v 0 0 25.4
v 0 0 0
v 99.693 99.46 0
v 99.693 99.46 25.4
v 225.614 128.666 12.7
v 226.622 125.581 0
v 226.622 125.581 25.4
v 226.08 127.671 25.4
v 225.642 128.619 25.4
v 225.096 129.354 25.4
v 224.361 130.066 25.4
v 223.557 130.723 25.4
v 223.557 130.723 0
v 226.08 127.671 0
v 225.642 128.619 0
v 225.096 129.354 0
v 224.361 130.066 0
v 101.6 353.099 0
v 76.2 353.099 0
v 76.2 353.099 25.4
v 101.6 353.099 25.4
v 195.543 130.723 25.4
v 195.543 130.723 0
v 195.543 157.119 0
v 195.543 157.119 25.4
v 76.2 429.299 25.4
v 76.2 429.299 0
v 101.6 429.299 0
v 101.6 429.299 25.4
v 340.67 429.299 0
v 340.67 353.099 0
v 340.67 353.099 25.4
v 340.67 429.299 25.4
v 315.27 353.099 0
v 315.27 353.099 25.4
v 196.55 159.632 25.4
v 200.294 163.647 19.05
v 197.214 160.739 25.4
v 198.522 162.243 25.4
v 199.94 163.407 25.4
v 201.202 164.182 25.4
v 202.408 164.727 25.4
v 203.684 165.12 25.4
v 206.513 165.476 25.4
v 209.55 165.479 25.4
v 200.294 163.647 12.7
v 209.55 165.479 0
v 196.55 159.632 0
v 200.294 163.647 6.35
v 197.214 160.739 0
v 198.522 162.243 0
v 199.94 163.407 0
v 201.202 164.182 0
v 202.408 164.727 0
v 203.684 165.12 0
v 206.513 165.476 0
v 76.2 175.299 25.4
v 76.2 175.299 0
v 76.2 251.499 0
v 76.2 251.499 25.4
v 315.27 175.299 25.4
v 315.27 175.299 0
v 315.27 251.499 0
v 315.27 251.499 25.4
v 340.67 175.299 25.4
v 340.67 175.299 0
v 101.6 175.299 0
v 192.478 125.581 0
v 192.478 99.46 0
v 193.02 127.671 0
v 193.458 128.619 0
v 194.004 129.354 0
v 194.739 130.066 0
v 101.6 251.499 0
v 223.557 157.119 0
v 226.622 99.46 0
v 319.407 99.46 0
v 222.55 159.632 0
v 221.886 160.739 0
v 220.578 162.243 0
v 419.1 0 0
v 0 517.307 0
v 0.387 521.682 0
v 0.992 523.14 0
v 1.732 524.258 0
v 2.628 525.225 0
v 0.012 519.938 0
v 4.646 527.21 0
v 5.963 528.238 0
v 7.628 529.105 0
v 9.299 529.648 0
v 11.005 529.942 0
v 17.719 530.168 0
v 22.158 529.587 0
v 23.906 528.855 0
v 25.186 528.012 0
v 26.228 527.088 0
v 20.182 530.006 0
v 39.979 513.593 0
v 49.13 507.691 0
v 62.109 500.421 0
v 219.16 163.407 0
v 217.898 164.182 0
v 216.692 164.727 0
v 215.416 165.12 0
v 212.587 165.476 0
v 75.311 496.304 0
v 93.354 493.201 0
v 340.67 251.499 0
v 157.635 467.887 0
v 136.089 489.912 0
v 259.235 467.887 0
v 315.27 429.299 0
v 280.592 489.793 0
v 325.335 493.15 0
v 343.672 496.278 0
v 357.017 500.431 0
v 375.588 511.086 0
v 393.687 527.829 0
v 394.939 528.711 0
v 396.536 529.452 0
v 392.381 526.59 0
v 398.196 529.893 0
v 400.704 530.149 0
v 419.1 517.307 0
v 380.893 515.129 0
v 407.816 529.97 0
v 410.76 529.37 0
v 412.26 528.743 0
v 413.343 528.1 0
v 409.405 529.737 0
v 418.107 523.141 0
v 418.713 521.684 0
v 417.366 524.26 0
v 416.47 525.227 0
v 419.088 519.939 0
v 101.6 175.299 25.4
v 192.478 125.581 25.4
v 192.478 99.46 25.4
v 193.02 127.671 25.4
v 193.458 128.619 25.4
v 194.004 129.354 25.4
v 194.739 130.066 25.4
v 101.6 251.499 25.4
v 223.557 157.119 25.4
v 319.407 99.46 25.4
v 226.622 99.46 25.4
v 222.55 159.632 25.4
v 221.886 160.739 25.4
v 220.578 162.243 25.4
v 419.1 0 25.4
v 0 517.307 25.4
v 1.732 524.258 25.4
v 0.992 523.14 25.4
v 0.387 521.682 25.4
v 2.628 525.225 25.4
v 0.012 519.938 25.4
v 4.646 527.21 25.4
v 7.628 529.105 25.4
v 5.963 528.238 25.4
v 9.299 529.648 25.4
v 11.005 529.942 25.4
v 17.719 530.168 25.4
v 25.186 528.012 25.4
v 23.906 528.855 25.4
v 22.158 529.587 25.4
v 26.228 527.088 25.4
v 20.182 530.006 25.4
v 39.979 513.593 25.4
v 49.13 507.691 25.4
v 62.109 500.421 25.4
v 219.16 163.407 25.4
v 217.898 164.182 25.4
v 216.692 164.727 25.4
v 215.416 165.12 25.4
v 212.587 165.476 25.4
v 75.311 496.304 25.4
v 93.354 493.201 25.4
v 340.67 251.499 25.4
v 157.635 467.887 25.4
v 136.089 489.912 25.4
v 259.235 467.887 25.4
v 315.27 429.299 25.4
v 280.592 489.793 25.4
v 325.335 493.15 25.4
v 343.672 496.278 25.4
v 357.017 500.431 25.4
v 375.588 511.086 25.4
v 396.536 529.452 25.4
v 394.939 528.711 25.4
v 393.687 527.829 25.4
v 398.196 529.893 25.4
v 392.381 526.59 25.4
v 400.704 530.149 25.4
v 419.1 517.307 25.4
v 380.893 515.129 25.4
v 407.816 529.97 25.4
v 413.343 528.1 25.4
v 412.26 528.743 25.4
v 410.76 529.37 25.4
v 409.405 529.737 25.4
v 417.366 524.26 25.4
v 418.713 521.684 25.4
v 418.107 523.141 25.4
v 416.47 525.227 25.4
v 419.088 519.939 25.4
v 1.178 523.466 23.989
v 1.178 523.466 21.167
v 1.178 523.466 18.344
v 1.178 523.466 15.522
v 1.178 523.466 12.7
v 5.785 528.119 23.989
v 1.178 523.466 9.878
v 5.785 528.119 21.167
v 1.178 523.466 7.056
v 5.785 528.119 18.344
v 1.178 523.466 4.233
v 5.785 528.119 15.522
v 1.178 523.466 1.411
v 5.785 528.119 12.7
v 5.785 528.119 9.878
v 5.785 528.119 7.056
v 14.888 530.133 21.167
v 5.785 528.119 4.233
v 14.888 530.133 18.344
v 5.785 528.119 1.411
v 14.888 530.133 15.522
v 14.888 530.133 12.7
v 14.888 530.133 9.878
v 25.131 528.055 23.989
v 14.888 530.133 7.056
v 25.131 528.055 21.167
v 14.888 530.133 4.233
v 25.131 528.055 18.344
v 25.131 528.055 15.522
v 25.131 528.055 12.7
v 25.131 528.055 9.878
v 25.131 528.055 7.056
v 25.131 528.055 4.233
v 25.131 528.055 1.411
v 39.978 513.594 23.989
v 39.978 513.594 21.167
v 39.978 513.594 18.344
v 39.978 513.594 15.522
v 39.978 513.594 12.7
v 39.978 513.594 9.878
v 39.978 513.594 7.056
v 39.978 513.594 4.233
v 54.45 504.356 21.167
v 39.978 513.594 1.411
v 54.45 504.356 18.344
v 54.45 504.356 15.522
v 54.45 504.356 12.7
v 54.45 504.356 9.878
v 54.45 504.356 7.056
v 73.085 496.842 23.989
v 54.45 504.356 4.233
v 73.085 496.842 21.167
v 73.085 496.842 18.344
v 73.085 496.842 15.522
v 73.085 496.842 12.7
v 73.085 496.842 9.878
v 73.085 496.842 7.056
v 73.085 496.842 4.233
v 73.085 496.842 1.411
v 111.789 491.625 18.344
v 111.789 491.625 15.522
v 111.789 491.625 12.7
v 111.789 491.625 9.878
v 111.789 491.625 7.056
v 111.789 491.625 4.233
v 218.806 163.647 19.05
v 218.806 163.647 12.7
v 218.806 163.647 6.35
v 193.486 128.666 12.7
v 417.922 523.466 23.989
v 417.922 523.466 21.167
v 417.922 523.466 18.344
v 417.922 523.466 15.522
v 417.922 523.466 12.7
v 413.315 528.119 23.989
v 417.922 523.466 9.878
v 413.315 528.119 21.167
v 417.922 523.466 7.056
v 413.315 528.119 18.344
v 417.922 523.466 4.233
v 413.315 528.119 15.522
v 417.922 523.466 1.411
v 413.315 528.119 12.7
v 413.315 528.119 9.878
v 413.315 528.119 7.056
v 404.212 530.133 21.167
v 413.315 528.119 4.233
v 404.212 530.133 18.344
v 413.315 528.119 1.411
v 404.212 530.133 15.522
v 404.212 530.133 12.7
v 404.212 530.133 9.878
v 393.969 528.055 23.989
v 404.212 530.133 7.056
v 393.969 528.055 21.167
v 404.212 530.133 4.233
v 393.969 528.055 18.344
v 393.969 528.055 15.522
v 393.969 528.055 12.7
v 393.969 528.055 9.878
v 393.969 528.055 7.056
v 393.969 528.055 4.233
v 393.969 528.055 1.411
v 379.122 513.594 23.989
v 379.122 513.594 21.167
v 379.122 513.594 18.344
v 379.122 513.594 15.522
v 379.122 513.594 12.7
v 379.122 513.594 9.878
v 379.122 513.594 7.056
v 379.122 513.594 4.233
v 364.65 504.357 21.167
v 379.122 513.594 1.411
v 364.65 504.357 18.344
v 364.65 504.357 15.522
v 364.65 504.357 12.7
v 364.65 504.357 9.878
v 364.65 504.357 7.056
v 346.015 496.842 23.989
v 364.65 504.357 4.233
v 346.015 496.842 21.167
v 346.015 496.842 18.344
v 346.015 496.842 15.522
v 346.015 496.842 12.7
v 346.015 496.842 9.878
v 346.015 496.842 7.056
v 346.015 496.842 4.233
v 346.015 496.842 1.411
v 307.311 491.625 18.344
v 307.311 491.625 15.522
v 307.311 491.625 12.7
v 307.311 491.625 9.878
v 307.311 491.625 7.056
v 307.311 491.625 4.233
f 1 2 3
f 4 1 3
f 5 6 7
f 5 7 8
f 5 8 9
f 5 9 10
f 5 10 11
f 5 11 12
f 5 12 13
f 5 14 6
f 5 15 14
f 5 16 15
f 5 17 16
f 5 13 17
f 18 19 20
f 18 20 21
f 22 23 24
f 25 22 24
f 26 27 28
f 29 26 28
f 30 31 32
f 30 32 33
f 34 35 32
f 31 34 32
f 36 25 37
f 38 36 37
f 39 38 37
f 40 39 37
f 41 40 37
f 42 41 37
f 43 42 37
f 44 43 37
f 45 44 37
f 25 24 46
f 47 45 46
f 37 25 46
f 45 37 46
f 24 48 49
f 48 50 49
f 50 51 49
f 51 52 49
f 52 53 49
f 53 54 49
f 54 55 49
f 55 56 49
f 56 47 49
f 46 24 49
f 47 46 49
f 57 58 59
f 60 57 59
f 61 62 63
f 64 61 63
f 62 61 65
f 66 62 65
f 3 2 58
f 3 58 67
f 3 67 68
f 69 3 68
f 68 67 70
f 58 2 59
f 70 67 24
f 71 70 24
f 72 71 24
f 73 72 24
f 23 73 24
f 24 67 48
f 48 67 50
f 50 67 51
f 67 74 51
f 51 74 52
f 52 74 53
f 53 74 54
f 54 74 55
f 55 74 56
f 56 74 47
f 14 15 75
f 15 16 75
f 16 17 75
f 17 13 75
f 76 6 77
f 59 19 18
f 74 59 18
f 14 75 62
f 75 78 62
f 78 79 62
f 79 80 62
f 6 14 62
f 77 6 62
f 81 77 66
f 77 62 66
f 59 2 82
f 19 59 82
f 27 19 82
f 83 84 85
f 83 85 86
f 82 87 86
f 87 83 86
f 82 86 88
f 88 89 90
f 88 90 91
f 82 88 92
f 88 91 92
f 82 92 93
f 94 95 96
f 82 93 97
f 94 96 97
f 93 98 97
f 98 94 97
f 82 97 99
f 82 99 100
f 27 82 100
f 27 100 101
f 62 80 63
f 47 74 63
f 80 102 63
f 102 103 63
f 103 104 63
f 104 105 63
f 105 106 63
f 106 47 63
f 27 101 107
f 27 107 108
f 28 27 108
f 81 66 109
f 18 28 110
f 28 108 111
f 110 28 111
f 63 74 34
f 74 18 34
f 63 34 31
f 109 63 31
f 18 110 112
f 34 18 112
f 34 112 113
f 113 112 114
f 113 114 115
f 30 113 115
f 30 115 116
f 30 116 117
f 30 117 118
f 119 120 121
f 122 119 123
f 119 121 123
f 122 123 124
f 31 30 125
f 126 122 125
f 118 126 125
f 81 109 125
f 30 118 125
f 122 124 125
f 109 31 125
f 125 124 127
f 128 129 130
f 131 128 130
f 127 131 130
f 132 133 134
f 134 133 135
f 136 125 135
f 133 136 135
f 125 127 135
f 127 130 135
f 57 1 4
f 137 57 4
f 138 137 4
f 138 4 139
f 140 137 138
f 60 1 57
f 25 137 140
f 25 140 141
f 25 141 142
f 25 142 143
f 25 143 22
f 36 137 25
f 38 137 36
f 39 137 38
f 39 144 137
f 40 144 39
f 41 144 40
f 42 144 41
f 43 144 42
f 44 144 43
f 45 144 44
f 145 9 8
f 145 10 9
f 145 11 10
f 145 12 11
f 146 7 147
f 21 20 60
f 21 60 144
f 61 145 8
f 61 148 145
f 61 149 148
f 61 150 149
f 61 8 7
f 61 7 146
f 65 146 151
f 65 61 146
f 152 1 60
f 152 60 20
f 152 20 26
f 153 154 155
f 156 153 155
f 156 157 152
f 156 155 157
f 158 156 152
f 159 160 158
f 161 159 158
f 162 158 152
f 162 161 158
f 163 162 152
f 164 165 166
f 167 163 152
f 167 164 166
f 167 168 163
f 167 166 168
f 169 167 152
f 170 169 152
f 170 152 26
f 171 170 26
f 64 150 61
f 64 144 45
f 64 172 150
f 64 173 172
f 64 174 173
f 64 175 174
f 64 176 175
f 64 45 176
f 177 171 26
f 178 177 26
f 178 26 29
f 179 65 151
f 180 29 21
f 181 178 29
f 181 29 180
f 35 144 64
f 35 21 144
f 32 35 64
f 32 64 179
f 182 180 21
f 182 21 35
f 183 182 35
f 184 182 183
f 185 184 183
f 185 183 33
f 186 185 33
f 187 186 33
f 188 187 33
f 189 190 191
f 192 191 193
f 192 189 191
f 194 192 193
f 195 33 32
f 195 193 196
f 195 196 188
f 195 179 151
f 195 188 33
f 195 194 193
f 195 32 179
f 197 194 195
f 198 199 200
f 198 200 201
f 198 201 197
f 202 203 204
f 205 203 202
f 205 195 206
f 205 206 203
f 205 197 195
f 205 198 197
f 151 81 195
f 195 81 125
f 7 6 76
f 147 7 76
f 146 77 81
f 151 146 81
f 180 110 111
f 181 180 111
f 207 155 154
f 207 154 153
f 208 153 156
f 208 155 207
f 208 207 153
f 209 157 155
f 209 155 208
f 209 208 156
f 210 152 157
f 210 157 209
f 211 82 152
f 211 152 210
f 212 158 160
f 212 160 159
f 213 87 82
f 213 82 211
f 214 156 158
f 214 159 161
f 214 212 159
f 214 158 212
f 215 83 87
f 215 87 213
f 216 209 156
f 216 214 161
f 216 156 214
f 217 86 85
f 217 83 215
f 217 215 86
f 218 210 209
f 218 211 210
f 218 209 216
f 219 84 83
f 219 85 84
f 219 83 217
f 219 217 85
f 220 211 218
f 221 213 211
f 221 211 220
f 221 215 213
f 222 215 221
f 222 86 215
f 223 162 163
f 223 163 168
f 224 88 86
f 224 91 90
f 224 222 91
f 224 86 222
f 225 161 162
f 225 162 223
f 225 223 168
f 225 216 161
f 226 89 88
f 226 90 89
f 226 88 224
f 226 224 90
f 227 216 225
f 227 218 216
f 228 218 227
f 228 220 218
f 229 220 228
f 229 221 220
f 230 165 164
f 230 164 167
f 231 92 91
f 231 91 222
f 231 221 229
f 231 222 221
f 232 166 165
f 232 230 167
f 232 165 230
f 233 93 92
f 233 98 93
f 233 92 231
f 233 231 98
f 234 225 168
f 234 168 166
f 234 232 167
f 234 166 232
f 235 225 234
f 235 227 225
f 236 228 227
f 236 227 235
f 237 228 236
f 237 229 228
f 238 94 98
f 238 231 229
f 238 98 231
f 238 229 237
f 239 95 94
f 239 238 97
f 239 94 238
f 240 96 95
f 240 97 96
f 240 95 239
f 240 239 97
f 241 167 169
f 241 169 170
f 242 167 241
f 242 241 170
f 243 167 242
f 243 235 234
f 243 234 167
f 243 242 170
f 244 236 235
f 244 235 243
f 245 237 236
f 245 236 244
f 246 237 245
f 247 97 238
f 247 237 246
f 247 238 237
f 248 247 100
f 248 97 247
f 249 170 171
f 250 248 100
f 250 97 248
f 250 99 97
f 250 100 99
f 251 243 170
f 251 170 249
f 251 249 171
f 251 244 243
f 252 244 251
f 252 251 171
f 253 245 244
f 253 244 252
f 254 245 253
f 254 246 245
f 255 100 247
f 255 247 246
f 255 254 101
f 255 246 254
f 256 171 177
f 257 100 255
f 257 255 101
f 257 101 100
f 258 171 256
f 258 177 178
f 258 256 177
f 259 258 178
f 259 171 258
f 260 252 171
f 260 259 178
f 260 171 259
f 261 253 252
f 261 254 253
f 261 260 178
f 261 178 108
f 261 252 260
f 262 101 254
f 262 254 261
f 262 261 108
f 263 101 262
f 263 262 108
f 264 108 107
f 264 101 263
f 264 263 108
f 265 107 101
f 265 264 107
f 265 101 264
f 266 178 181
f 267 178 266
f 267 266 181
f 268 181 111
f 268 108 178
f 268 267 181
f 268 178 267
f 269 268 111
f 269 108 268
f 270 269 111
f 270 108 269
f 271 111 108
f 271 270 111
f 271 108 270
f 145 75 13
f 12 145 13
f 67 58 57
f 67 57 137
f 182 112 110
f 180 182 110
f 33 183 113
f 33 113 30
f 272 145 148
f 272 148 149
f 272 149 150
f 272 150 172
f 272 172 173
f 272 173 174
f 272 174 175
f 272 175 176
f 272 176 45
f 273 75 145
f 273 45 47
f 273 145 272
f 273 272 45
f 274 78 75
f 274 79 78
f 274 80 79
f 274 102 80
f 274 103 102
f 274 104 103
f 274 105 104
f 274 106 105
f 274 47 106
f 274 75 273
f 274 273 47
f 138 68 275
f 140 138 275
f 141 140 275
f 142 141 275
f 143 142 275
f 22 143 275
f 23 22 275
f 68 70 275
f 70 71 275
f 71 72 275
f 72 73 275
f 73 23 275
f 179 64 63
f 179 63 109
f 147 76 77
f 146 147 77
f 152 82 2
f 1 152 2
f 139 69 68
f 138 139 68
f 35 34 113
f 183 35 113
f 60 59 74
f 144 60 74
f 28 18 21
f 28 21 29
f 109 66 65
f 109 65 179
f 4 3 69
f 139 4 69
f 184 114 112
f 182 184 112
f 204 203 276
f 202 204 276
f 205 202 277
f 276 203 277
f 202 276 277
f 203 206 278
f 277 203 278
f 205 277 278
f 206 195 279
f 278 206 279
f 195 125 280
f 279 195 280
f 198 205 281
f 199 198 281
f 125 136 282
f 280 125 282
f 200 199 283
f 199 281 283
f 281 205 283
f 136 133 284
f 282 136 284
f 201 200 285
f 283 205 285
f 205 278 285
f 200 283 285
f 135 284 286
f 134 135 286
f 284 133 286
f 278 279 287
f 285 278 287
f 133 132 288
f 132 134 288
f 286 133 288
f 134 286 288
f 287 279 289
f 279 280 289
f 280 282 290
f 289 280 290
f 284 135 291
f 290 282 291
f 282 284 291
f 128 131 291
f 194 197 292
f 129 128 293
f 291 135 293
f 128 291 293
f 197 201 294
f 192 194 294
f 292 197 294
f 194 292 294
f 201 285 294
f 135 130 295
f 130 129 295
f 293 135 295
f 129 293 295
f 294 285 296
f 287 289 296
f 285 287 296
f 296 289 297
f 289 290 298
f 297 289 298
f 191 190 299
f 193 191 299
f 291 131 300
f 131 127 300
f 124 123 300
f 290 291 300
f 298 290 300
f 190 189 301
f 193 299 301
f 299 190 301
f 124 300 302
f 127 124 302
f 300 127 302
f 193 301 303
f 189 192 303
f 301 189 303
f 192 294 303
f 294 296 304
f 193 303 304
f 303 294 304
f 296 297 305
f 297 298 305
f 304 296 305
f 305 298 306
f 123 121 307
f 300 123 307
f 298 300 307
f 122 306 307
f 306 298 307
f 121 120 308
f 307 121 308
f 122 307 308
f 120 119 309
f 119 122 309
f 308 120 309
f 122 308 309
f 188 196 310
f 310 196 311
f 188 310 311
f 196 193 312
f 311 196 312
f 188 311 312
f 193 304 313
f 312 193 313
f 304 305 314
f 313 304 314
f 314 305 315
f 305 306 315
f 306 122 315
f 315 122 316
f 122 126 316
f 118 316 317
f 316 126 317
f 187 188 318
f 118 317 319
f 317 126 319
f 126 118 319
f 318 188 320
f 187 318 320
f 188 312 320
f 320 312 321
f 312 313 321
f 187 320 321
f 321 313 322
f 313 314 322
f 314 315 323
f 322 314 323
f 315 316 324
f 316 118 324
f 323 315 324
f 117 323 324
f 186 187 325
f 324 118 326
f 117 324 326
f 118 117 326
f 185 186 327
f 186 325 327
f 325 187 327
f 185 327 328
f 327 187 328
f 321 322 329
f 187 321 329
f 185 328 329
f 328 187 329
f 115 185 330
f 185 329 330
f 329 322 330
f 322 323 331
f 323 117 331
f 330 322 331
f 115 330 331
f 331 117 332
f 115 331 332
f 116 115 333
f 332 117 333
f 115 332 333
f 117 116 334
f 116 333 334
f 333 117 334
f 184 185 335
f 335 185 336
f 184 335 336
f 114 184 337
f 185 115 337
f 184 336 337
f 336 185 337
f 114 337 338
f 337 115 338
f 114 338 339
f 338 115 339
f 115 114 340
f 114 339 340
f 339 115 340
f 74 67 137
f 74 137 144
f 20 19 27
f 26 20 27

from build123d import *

# Parameters (mm, degrees)
F0_W     = 25.4
F0_H     = 76.2
F1_DEPTH = 25.4


with BuildPart() as f1:
    # F0 (on Top) → F1 (new body)
    with BuildSketch(Plane.XY):
        with BuildLine():
            Line((419.1, 0), (419.1, 29.1582643986))
            Line((419.1, 29.1582643986), (419.1, 517.3072619364))
            add(Edge.make_bspline(
                [(419.1, 517.3072619364), (419.147134559, 518.1974042934), (419.2318387678, 519.7970544265), (418.5736114874, 522.4337537795), (417.4270728627, 524.340815455), (415.824487225, 525.8167119843), (413.4287542387, 528.3993527548), (409.391086273, 530.0033373842), (404.9057722898, 530.0934799636), (398.2767909208, 530.3547825459), (393.7627427273, 528.3669327043), (390.6329406281, 524.4826903766), (386.0666251069, 520.6257581861), (379.3912610246, 512.9725078822), (369.8666381536, 507.866922061), (360.8468497656, 501.5892907558), (346.1541795146, 496.249451646), (324.3776438612, 492.7738532505), (313.0432898306, 492.0475559722), (291.3217386764, 490.4842105973), (280.5920723689, 489.7933052515)],
                knots=[0, 0, 0, 0, 0.0293824295, 0.0595084345, 0.0867094239, 0.1137588548, 0.1481751544, 0.1859995547, 0.2256015417, 0.272993986, 0.3133318288, 0.3535640445, 0.3987236757, 0.4573744575, 0.5181503343, 0.5787543994, 0.6523036094, 0.7362677531, 0.8158837187, 0.8760699048, 0.8760699048, 0.8760699048, 0.8760699048], degree=3))
            Line((280.5920723689, 489.7933052515), (259.2350669765, 467.8874437258))
            Line((259.2350669765, 467.8874437258), (208.4350669765, 467.8874437258))
            Line((208.4350669765, 467.8874437258), (157.6350669765, 467.8874437258))
            Line((157.6350669765, 467.8874437258), (136.0886816558, 489.9119997113))
            add(Edge.make_bspline(
                [(0, 517.3072619364), (-0.047232954, 518.1992624967), (-0.1317917187, 519.7961658976), (0.526377146, 522.4339684383), (1.6729300089, 524.3407612277), (3.2755117734, 525.8167308821), (5.6712460924, 528.3993465881), (9.7089136128, 530.0033391805), (14.1942278227, 530.0934793681), (20.8232087283, 530.3547826623), (25.3372583383, 528.3669327573), (28.4670551881, 524.4826900379), (33.0333949249, 520.6257598555), (39.7086378543, 512.9724994358), (49.233750463, 507.8669545255), (58.2515767921, 501.5891593114), (72.9535489254, 496.2500972756), (94.6899012537, 492.7711419872), (105.9514249536, 492.0689950432), (126.384684191, 490.5612427498), (136.0886816558, 489.9119997113)],
                knots=[0, 0, 0, 0, 0.0294437663, 0.0596326604, 0.0868904328, 0.1139963304, 0.1484844752, 0.1863878353, 0.2260724928, 0.2735638704, 0.3139859199, 0.3543021218, 0.3995560253, 0.4583292427, 0.5192319912, 0.5799625695, 0.6536653159, 0.7378047377, 0.8175869044, 0.8738467686, 0.8738467686, 0.8738467686, 0.8738467686], degree=3))
            Line((0, 517.3072619364), (0, 29.1582643986))
            Line((0, 29.1582643986), (0, 0))
            Line((0, 0), (99.6925341323, 99.4598194957))
            Line((99.6925341323, 99.4598194957), (181.0018675759, 99.4598194957))
            Line((181.0018675759, 99.4598194957), (192.4783936119, 99.4598194957))
            Line((192.4783936119, 99.4598194957), (192.4783936119, 125.5809245631))
            add(Edge.make_bspline(
                [(192.4783936119, 125.5809245631), (192.7145980862, 126.6874069404), (193.1744124211, 128.8413731597), (194.7679380521, 130.1071507729), (195.5428770161, 130.7227043435)],
                knots=[0, 0, 0, 0, 0.5136953251, 1, 1, 1, 1], degree=3))
            Line((195.5428770161, 130.7227043435), (195.5428770161, 157.1194035932))
            add(Edge.make_bspline(
                [(195.5428770161, 157.1194035932), (195.9518024102, 158.2916305791), (196.8054091098, 160.7385825731), (200.1937150151, 163.9060107886), (204.2783832523, 165.573676434), (207.7363179785, 165.5118270656), (209.55, 165.4793871567)],
                knots=[0, 0, 0, 0, 0.2304795373, 0.4811119095, 0.7278439081, 1, 1, 1, 1], degree=3))
            add(Edge.make_bspline(
                [(223.5571229839, 157.1194035932), (223.1481975898, 158.2916305791), (222.2945908902, 160.7385825731), (218.9062849849, 163.9060107886), (214.8216167477, 165.573676434), (211.3636820215, 165.5118270656), (209.55, 165.4793871567)],
                knots=[0, 0, 0, 0, 0.2304795373, 0.4811119095, 0.7278439081, 1, 1, 1, 1], degree=3))
            Line((223.5571229839, 157.1194035932), (223.5571229839, 130.7227043435))
            add(Edge.make_bspline(
                [(226.6216063881, 125.5809245631), (226.3854019138, 126.6874069404), (225.9255875789, 128.8413731597), (224.3320619479, 130.1071507729), (223.5571229839, 130.7227043435)],
                knots=[0, 0, 0, 0, 0.5136953251, 1, 1, 1, 1], degree=3))
            Line((226.6216063881, 125.5809245631), (226.6216063881, 99.4598194957))
            Line((226.6216063881, 99.4598194957), (238.0981324241, 99.4598194957))
            Line((238.0981324241, 99.4598194957), (319.4074658677, 99.4598194957))
            Line((319.4074658677, 99.4598194957), (419.1, 0))
        make_face()
        with Locations((88.9, 213.3992624967)):
            Rectangle(F0_W, F0_H, mode=Mode.SUBTRACT)
        with Locations((327.9701339531, 213.3992624967)):
            Rectangle(F0_W, F0_H, mode=Mode.SUBTRACT)
        with Locations((88.9, 391.1992624967)):
            Rectangle(F0_W, F0_H, mode=Mode.SUBTRACT)
        with Locations((327.9701339531, 391.1992624967)):
            Rectangle(F0_W, F0_H, mode=Mode.SUBTRACT)
    extrude(amount=F1_DEPTH)


solid = f1.part
